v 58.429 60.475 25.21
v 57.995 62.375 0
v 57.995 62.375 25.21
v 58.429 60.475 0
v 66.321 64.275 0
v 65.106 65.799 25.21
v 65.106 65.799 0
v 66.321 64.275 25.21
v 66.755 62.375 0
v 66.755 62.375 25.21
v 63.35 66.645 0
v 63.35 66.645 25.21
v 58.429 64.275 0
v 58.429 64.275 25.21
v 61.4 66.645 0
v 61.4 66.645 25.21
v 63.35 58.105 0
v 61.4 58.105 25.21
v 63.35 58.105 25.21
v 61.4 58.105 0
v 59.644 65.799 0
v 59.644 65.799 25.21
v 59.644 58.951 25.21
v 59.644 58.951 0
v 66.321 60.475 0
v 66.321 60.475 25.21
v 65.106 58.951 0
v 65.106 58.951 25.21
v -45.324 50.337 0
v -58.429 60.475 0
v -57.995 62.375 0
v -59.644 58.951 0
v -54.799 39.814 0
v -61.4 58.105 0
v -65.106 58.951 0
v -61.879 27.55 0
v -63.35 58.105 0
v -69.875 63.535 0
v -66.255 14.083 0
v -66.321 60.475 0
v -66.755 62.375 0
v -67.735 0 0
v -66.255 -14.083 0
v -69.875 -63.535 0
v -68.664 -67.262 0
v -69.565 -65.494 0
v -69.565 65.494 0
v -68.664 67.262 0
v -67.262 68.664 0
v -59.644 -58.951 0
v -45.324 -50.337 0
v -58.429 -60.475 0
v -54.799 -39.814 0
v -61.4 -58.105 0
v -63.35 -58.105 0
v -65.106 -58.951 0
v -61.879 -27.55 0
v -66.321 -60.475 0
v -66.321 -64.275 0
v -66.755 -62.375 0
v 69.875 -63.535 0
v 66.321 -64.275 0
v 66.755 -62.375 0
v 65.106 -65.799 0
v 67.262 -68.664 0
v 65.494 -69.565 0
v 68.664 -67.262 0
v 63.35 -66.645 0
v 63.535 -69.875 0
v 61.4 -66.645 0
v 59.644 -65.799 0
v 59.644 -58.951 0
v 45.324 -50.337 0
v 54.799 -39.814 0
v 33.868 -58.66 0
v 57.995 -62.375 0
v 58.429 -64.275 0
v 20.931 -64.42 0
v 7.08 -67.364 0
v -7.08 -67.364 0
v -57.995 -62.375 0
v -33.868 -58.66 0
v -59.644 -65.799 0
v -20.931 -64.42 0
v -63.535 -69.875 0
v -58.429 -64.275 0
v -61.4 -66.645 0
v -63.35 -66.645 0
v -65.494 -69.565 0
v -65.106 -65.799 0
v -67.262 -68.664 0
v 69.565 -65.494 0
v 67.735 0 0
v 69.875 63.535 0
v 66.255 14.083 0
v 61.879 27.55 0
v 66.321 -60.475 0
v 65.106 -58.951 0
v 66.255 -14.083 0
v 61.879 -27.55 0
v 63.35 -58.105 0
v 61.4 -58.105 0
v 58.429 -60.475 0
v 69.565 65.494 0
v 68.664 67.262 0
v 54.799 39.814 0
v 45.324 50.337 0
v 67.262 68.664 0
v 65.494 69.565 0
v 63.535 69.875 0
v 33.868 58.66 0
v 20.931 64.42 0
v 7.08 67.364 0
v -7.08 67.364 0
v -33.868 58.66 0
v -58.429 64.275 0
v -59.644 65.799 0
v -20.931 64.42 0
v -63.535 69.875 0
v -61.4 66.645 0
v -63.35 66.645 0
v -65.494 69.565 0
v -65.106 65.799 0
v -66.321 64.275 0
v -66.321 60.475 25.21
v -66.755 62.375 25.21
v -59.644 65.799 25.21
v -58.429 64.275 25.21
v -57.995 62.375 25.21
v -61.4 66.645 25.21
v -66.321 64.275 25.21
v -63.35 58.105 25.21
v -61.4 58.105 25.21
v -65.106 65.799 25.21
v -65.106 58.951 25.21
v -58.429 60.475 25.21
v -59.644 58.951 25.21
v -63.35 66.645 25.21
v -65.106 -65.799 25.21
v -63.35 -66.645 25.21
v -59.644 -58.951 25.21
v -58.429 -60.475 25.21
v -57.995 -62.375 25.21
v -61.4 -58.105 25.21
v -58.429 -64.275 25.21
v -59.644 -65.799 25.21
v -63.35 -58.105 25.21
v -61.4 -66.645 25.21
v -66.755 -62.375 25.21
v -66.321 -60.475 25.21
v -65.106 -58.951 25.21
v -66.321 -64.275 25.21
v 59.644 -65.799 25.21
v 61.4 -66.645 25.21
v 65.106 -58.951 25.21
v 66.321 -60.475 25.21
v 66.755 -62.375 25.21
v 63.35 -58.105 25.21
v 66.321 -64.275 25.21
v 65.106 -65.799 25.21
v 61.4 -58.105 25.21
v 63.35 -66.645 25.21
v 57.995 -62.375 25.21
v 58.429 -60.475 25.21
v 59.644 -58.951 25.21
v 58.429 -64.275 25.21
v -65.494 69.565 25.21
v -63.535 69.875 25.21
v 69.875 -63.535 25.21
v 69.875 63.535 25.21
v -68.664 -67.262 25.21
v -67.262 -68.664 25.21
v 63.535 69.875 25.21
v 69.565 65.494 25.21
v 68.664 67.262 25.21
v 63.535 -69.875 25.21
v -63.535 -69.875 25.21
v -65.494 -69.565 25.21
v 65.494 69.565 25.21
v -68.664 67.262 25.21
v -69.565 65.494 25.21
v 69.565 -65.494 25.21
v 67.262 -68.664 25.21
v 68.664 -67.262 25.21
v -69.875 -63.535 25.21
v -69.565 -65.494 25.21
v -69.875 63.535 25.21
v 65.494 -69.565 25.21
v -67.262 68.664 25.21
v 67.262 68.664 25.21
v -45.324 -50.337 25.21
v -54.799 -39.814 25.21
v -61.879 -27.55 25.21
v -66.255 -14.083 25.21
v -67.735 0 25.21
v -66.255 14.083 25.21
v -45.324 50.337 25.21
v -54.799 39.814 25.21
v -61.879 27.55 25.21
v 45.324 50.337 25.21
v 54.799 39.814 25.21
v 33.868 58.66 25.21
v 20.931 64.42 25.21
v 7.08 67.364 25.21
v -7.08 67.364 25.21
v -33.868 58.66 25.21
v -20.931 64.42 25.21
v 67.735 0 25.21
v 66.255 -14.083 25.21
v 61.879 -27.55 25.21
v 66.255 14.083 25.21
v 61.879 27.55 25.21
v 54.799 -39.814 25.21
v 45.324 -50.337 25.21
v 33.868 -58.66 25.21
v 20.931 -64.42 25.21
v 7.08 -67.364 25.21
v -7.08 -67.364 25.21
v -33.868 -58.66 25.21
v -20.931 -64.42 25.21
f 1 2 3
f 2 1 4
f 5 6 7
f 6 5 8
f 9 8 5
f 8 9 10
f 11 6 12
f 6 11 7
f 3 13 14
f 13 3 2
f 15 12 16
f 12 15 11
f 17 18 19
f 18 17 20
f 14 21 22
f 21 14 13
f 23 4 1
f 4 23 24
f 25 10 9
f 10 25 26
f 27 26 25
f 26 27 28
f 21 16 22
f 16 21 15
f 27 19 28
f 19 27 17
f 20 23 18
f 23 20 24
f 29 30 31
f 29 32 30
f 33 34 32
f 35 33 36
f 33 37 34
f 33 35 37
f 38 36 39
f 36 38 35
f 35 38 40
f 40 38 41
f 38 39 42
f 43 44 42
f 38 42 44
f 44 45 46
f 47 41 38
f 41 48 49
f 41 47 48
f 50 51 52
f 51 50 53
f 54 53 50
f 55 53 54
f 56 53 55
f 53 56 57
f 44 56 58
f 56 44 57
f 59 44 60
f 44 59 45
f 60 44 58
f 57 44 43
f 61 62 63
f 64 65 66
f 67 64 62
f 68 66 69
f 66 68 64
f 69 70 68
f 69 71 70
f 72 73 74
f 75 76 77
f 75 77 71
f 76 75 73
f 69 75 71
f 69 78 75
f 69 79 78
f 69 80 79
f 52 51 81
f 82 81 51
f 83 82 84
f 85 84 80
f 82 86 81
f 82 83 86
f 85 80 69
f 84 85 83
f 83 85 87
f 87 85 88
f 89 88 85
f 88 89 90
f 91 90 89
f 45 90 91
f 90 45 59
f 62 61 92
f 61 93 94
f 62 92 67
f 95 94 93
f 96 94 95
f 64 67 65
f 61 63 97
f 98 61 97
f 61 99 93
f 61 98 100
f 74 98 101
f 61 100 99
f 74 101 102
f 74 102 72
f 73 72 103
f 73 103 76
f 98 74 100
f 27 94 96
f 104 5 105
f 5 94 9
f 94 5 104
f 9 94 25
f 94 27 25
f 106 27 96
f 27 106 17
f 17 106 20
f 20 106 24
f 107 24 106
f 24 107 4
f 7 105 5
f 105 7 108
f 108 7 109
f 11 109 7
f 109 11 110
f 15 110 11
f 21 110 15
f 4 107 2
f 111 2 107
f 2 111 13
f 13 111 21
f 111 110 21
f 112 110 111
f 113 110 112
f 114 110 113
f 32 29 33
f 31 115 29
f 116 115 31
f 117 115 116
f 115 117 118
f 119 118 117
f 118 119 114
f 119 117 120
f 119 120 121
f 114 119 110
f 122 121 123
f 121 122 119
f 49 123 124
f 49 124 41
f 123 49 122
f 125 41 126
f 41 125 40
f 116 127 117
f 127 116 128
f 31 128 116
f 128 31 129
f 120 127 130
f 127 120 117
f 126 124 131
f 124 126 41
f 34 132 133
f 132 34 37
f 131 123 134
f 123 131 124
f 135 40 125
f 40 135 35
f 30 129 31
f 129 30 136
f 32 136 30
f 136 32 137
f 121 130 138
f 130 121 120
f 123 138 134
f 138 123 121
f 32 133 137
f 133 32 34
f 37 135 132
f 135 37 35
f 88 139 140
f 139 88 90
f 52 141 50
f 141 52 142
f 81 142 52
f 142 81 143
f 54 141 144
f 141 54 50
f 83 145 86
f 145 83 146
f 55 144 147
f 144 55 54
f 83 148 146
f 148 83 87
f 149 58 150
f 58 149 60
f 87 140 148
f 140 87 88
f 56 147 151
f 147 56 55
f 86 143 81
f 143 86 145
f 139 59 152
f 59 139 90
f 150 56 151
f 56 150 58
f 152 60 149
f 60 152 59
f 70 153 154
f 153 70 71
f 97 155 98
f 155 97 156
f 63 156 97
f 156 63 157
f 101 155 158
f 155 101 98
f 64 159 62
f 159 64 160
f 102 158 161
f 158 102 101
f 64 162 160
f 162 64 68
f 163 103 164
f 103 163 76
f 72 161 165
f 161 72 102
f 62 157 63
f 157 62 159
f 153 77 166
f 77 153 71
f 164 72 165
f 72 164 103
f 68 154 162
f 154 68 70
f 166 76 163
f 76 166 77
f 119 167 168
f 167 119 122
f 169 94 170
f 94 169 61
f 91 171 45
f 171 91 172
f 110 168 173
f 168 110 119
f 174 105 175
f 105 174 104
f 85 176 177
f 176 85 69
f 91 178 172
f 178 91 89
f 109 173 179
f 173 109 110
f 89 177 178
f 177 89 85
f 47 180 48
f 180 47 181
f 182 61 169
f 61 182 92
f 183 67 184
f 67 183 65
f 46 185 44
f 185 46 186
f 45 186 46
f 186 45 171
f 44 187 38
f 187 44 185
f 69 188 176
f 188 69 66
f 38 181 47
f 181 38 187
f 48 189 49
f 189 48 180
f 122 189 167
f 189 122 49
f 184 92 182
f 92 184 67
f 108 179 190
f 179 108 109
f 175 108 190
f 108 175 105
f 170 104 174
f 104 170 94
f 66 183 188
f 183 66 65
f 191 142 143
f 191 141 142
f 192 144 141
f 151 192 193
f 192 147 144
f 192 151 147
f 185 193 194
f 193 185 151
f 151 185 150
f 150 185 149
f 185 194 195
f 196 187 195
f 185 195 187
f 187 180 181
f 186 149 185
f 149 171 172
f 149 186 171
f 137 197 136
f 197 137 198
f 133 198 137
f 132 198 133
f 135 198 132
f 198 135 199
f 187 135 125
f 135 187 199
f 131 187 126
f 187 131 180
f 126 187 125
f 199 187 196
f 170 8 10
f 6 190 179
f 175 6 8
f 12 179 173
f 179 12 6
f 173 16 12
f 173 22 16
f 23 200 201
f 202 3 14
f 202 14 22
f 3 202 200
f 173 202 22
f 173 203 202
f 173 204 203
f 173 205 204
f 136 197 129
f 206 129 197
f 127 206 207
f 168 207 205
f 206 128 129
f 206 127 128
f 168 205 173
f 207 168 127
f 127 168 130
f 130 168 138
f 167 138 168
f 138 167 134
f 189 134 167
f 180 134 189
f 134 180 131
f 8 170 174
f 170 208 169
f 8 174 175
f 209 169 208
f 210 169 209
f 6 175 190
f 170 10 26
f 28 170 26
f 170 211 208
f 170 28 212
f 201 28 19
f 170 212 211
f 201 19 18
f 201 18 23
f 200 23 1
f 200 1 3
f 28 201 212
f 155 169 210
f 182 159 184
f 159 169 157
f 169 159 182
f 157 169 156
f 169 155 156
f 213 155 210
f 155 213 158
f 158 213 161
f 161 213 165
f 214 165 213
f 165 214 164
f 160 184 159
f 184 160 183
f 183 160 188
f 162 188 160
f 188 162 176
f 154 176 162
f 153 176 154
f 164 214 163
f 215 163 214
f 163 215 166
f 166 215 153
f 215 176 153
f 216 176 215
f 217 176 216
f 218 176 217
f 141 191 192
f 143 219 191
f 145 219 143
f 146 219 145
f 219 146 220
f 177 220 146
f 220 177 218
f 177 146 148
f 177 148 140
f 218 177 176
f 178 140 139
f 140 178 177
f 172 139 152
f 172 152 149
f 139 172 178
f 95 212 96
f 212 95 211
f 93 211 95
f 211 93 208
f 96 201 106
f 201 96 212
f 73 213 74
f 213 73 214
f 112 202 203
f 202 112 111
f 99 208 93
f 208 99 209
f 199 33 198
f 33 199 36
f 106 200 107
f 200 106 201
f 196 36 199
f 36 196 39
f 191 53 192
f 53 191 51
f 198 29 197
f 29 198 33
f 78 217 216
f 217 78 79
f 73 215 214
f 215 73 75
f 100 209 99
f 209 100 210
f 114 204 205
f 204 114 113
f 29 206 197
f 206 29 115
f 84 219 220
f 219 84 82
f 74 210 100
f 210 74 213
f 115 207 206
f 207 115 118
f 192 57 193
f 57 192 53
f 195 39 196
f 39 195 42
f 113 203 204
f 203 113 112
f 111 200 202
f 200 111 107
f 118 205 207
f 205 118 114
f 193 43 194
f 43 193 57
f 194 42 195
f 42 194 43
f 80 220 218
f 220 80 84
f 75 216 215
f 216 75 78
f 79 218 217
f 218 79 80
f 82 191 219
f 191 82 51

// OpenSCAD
fan_outside = 139.75;
fan_wall =    2.14;       // radius to straight wall

fan_inside_diameter=fan_outside - fan_wall * 2;
fan_inside_radius = fan_inside_diameter/2;

fan_thickness = 25.21;
fan_hole2hole = 124.75;
fan_screw_hole_diameter = 4.38;
fan_corner_radius = 6.34;


fan_holes_radius=sqrt( 2 * (fan_hole2hole * fan_hole2hole))/2;
echo (fan_holes_radius);

// make 4 "posts" about 0,0,0 offset by +/-x +/-y 
module posts(x,y,z,h,r)
{
    translate([x,y,z]){         // move post to this location
        cylinder(r = r, h = h); // make one post
    }
    translate([-x,y,z]){        // move post to this location
        cylinder(r = r, h = h); // make one post
    }   
    translate([-x,-y,z]){       // move post to this location
        cylinder(r = r, h = h); // make one post
    }
    translate([x,-y,z]){        // move post to this location
        cylinder(r = r, h = h); // make one post
    }    
}


    
difference() 
{
    // make 2 boxes one inside the other and remove "inside box" from "outside box"
    // use posts to define OUTSIDE of a solid box centered on 0,0
    hull()
    {
        // solid box max fan dimensions
        posts(  
            x=(fan_outside/2  - fan_corner_radius),
            y=(fan_outside/2 - fan_corner_radius),
            z= 0,
            h= fan_thickness,
            r = fan_corner_radius);
    }

    cylinder( h=fan_thickness+1, r= fan_inside_radius, center=false);
    
    // punch out the screw holes
    posts(  
        x=fan_hole2hole/2,
        y=fan_hole2hole/2,
        z= 0,
        h= fan_thickness+1,
        r = fan_screw_hole_diameter);
}
